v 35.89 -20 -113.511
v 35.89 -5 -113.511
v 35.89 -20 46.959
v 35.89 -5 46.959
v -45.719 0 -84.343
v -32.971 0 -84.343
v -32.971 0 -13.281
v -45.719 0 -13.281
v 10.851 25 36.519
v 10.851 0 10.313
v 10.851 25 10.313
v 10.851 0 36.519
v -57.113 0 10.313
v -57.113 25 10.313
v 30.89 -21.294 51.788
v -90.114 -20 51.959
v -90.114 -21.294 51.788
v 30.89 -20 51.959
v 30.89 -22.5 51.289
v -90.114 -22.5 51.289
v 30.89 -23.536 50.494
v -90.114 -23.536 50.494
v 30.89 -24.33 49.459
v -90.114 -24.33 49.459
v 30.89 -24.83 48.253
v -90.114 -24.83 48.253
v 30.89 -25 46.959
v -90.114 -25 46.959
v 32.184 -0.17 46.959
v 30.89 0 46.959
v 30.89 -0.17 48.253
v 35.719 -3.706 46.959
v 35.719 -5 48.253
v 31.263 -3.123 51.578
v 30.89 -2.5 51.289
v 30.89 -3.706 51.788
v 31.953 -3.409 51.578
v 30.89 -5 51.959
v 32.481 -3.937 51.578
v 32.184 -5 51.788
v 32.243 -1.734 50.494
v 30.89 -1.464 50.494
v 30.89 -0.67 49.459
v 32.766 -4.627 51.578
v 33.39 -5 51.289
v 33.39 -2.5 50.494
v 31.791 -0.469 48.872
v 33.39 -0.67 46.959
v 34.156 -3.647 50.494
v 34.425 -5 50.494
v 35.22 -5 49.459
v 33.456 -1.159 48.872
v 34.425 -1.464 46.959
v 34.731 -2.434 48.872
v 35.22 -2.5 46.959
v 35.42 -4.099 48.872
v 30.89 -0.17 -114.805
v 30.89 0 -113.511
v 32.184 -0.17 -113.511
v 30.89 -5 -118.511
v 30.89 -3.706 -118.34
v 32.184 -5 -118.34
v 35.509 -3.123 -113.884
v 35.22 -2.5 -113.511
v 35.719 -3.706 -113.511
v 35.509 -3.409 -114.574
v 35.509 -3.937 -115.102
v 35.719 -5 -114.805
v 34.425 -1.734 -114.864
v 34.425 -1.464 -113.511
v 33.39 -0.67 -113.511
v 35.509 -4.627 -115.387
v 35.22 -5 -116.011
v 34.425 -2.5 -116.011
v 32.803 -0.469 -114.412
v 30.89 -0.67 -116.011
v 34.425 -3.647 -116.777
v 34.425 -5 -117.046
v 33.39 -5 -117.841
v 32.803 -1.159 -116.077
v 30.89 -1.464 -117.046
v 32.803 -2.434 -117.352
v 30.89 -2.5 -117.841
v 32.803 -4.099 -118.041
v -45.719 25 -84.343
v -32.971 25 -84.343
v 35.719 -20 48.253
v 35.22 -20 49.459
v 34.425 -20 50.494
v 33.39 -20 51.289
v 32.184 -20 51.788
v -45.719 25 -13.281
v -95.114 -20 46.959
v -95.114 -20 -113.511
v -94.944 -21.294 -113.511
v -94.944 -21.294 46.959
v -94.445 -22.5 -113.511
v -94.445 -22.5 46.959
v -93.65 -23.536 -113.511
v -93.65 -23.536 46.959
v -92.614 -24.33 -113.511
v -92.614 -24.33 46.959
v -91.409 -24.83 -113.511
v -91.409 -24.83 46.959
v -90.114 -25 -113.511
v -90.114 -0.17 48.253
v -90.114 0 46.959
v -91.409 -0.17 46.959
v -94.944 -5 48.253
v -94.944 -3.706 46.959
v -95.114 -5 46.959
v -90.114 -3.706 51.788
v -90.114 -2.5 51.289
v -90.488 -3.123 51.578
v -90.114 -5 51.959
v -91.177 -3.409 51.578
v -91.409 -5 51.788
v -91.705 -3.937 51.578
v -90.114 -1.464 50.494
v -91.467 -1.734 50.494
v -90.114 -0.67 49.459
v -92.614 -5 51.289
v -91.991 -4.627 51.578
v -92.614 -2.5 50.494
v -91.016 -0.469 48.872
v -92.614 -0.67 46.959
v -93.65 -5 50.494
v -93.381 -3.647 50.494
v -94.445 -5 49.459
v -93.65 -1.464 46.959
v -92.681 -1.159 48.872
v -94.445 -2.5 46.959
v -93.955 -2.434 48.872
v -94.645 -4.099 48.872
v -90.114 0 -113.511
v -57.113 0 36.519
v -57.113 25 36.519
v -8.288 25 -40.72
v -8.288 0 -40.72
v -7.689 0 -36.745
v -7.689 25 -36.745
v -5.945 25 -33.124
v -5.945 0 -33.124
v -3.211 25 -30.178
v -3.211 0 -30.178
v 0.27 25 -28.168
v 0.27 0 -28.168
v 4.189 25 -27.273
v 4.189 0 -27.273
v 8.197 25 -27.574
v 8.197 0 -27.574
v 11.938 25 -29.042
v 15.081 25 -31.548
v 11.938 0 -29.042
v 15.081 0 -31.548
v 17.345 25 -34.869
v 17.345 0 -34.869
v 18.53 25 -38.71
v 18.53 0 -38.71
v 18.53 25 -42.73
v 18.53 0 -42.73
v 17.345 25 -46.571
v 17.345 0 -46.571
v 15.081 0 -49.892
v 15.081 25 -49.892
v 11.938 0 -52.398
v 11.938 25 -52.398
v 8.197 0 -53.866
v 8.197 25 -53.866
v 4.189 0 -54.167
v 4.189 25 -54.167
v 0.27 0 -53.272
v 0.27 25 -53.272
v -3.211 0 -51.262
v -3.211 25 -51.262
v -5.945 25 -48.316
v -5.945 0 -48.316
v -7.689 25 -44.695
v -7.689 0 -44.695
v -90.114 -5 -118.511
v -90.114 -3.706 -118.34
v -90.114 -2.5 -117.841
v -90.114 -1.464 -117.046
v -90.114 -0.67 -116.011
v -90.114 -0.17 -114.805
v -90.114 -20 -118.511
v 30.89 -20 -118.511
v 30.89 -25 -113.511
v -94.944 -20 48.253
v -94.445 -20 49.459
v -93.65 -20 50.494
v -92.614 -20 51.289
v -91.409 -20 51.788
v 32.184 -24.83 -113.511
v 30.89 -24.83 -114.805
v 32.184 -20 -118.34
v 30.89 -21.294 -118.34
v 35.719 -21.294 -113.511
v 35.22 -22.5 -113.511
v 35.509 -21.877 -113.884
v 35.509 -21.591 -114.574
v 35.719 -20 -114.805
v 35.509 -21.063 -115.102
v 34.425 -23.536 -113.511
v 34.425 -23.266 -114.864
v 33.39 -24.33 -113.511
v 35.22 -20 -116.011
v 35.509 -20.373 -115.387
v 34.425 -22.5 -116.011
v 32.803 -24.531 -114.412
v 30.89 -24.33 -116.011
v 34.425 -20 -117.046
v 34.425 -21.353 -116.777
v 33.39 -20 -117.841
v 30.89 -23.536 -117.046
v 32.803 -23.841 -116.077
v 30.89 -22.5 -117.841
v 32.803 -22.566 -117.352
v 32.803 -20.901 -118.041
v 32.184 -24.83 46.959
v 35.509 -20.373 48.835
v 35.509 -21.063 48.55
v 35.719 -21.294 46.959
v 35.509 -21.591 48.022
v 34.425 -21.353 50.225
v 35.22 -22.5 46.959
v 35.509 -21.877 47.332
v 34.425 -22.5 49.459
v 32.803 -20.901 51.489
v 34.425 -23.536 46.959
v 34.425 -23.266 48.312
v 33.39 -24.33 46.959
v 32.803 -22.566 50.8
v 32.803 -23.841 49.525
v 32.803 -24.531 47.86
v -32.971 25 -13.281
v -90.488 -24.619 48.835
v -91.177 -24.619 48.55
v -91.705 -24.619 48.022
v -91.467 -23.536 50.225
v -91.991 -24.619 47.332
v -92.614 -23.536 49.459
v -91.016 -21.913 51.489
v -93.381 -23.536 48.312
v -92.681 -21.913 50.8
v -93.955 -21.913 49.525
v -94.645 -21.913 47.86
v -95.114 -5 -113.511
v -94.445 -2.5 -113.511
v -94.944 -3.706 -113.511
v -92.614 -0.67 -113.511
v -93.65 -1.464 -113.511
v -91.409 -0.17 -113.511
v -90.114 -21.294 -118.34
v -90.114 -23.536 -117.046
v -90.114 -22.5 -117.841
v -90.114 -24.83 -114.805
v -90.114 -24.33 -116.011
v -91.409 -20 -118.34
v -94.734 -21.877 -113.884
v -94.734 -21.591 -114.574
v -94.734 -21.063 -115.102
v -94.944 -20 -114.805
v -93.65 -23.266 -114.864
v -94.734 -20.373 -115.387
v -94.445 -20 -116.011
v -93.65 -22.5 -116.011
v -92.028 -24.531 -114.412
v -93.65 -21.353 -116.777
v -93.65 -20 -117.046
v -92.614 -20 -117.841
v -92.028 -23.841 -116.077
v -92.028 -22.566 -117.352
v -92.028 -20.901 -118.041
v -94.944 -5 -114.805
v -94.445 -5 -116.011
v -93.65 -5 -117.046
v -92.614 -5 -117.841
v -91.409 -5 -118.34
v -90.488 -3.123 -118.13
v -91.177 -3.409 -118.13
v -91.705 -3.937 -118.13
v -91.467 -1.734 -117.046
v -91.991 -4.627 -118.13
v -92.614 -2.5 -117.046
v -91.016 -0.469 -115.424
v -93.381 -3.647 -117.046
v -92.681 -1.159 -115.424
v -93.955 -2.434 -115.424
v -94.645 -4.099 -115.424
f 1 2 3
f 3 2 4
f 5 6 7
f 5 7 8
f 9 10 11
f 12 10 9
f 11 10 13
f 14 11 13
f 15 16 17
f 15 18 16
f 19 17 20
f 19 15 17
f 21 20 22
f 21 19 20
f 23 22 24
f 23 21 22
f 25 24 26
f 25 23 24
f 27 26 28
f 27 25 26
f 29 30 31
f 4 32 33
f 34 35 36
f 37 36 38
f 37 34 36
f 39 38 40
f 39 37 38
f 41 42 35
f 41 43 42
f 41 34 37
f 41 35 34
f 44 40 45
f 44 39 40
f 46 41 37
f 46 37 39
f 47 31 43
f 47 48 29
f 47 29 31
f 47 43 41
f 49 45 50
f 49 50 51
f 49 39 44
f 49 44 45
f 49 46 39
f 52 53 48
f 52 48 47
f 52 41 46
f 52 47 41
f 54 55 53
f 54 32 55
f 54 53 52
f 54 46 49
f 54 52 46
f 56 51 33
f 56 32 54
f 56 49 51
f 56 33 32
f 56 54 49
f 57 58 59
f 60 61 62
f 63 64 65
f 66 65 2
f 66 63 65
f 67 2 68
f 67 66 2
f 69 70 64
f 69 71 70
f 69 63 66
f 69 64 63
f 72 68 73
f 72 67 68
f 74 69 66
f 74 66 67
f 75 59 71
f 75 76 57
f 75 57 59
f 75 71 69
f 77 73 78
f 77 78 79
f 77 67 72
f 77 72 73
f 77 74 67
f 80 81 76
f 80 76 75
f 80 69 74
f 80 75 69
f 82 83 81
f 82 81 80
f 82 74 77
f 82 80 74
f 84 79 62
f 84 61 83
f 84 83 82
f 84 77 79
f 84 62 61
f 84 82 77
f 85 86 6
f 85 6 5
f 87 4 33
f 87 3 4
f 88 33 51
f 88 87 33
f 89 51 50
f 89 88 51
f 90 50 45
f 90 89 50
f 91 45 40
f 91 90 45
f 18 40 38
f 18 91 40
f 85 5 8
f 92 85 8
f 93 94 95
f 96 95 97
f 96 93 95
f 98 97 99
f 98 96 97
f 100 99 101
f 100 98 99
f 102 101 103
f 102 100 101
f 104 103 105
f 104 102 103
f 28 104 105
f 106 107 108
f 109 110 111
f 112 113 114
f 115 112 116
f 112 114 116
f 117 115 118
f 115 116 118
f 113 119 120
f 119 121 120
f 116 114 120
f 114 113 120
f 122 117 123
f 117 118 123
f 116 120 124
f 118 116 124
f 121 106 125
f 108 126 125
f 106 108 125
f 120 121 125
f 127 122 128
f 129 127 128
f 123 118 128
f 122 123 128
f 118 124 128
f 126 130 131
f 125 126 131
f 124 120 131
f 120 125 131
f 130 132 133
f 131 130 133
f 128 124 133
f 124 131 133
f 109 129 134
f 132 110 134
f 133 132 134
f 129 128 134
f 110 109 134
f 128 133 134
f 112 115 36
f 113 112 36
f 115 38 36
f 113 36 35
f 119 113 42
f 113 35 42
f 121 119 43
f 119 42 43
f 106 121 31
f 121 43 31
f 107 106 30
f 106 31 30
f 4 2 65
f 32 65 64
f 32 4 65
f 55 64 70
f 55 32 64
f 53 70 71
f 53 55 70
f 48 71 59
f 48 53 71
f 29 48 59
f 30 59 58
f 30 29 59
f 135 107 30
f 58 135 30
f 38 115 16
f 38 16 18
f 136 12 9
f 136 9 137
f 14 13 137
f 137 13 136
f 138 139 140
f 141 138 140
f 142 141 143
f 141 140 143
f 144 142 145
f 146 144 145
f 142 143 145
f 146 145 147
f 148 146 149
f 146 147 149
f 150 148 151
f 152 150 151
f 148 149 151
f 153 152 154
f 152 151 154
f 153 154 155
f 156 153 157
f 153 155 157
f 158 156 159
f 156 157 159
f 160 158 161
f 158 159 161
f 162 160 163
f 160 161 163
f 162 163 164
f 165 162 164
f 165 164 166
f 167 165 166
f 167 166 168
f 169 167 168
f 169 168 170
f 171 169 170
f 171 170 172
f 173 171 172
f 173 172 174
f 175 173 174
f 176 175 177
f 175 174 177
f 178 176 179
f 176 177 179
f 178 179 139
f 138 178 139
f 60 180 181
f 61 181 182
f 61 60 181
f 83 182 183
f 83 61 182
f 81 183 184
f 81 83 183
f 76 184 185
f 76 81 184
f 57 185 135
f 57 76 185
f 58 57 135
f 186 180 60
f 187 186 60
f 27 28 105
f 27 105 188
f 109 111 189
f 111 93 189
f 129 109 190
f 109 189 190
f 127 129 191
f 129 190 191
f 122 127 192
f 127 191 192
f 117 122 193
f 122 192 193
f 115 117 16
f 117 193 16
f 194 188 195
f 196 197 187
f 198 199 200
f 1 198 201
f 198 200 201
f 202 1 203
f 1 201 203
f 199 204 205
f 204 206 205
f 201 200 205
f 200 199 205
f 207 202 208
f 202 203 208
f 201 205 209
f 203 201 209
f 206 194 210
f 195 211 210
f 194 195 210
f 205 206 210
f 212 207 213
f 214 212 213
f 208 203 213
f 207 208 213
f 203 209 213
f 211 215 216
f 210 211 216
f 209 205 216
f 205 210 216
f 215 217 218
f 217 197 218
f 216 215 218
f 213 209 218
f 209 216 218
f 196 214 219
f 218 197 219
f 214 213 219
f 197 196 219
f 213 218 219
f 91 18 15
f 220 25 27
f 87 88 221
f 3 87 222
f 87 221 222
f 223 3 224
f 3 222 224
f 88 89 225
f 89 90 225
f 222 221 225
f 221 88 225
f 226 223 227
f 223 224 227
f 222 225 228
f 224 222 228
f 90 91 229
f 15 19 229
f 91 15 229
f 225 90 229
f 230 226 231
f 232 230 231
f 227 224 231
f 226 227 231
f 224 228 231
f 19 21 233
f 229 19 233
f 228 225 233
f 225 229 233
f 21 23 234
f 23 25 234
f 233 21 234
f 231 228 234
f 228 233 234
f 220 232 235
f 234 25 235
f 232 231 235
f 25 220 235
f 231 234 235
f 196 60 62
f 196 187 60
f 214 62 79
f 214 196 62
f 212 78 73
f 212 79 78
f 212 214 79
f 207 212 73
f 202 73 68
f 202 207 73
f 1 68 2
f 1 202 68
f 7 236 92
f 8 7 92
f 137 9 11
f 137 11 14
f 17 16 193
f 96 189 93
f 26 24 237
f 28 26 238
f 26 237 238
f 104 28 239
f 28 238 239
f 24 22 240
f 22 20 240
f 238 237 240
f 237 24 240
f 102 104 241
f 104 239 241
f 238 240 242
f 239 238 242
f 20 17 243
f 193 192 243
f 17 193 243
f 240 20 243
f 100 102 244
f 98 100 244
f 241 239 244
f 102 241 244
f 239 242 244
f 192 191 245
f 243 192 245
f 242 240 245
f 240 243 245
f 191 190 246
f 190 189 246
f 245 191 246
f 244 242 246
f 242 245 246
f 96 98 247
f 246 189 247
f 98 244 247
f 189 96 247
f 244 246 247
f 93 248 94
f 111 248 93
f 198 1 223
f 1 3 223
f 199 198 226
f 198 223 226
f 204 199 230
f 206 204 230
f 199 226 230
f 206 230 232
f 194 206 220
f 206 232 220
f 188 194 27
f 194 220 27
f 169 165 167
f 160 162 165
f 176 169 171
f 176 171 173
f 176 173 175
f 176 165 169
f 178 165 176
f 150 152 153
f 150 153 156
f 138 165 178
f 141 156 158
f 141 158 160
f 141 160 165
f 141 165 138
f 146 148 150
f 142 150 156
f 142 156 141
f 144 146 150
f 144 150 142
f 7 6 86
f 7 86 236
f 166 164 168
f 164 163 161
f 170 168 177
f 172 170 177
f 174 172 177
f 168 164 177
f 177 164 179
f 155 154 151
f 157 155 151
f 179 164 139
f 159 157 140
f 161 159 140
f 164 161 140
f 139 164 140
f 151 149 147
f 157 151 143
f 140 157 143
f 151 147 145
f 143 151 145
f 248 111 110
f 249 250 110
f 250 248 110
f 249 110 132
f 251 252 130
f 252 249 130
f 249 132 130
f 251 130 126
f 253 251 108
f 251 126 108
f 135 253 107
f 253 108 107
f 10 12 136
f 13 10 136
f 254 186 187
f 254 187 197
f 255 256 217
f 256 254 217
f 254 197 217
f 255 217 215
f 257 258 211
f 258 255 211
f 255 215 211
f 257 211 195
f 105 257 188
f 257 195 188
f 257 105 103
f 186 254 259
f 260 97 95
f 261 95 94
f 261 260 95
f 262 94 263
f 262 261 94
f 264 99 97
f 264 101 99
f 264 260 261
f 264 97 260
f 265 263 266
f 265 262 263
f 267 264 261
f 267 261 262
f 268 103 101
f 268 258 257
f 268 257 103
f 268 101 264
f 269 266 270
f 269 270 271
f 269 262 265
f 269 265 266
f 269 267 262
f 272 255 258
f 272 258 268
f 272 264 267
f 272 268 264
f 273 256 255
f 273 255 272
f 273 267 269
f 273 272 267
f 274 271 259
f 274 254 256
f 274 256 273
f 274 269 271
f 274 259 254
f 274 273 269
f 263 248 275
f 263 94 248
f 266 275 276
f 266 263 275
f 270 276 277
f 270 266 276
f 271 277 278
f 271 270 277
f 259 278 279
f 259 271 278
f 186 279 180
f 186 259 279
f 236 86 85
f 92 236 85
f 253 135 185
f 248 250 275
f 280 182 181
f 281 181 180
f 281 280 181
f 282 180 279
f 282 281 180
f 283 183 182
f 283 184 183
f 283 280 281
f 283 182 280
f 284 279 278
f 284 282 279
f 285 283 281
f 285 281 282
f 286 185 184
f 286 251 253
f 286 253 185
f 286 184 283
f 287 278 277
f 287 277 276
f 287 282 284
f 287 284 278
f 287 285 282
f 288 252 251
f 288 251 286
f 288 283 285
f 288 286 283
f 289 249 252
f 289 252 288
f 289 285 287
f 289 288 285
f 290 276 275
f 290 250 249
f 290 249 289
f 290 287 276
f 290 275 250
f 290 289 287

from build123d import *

# Parameters (mm, degrees)
F0_W     = 131.00408
F0_H     = 170.469575
F1_DEPTH = 25
F2_R     = 5
F3_W     = 12.748081
F3_H     = 71.06166
F3_W_2   = 67.964261
F3_H_2   = 26.206454
F3_R     = 13.48426
F4_DEPTH = 25


with BuildPart() as f1:
    # F0 (on Front) → F1 (new body)
    with BuildSketch(Plane.XZ):
        with Locations((-29.61237, -33.275995)):
            Rectangle(F0_W, F0_H)
    extrude(amount=F1_DEPTH)

    # F2
    f2_edges = [f1.edges().sort_by_distance(p)[0] for p in [
        (-95.11441, 0, -33.275995),
        (-29.61237, 0, -118.510783),
        (35.88967, 0, -33.275995),
        (-29.61237, 0, 51.958792),
        (-95.11441, -12.5, 51.958792),
        (-29.61237, -25, 51.958792),
        (35.88967, -12.5, 51.958792),
        (-29.61237, -25, -118.510783),
        (-95.11441, -25, -33.275995),
        (35.88967, -25, -33.275995),
        (35.88967, -12.5, -118.510783),
        (-95.11441, -12.5, -118.510783),
    ]]
    fillet(f2_edges, radius=F2_R)


with BuildPart() as f4:
    # F3 (on face) → F4 (new body)
    with BuildSketch(Plane(origin=(0, 0, 0), x_dir=(-1, 0, 0), z_dir=(0, 1, 0))):
        with Locations((39.344786, -48.811881)):
            Rectangle(F3_W, F3_H)
        with Locations((23.131093, 23.415749)):
            Rectangle(F3_W_2, F3_H_2)
        with Locations((-5.196326, -40.719982)):
            Circle(F3_R)
    extrude(amount=F4_DEPTH)


solid = Compound([f1.part, f4.part])
